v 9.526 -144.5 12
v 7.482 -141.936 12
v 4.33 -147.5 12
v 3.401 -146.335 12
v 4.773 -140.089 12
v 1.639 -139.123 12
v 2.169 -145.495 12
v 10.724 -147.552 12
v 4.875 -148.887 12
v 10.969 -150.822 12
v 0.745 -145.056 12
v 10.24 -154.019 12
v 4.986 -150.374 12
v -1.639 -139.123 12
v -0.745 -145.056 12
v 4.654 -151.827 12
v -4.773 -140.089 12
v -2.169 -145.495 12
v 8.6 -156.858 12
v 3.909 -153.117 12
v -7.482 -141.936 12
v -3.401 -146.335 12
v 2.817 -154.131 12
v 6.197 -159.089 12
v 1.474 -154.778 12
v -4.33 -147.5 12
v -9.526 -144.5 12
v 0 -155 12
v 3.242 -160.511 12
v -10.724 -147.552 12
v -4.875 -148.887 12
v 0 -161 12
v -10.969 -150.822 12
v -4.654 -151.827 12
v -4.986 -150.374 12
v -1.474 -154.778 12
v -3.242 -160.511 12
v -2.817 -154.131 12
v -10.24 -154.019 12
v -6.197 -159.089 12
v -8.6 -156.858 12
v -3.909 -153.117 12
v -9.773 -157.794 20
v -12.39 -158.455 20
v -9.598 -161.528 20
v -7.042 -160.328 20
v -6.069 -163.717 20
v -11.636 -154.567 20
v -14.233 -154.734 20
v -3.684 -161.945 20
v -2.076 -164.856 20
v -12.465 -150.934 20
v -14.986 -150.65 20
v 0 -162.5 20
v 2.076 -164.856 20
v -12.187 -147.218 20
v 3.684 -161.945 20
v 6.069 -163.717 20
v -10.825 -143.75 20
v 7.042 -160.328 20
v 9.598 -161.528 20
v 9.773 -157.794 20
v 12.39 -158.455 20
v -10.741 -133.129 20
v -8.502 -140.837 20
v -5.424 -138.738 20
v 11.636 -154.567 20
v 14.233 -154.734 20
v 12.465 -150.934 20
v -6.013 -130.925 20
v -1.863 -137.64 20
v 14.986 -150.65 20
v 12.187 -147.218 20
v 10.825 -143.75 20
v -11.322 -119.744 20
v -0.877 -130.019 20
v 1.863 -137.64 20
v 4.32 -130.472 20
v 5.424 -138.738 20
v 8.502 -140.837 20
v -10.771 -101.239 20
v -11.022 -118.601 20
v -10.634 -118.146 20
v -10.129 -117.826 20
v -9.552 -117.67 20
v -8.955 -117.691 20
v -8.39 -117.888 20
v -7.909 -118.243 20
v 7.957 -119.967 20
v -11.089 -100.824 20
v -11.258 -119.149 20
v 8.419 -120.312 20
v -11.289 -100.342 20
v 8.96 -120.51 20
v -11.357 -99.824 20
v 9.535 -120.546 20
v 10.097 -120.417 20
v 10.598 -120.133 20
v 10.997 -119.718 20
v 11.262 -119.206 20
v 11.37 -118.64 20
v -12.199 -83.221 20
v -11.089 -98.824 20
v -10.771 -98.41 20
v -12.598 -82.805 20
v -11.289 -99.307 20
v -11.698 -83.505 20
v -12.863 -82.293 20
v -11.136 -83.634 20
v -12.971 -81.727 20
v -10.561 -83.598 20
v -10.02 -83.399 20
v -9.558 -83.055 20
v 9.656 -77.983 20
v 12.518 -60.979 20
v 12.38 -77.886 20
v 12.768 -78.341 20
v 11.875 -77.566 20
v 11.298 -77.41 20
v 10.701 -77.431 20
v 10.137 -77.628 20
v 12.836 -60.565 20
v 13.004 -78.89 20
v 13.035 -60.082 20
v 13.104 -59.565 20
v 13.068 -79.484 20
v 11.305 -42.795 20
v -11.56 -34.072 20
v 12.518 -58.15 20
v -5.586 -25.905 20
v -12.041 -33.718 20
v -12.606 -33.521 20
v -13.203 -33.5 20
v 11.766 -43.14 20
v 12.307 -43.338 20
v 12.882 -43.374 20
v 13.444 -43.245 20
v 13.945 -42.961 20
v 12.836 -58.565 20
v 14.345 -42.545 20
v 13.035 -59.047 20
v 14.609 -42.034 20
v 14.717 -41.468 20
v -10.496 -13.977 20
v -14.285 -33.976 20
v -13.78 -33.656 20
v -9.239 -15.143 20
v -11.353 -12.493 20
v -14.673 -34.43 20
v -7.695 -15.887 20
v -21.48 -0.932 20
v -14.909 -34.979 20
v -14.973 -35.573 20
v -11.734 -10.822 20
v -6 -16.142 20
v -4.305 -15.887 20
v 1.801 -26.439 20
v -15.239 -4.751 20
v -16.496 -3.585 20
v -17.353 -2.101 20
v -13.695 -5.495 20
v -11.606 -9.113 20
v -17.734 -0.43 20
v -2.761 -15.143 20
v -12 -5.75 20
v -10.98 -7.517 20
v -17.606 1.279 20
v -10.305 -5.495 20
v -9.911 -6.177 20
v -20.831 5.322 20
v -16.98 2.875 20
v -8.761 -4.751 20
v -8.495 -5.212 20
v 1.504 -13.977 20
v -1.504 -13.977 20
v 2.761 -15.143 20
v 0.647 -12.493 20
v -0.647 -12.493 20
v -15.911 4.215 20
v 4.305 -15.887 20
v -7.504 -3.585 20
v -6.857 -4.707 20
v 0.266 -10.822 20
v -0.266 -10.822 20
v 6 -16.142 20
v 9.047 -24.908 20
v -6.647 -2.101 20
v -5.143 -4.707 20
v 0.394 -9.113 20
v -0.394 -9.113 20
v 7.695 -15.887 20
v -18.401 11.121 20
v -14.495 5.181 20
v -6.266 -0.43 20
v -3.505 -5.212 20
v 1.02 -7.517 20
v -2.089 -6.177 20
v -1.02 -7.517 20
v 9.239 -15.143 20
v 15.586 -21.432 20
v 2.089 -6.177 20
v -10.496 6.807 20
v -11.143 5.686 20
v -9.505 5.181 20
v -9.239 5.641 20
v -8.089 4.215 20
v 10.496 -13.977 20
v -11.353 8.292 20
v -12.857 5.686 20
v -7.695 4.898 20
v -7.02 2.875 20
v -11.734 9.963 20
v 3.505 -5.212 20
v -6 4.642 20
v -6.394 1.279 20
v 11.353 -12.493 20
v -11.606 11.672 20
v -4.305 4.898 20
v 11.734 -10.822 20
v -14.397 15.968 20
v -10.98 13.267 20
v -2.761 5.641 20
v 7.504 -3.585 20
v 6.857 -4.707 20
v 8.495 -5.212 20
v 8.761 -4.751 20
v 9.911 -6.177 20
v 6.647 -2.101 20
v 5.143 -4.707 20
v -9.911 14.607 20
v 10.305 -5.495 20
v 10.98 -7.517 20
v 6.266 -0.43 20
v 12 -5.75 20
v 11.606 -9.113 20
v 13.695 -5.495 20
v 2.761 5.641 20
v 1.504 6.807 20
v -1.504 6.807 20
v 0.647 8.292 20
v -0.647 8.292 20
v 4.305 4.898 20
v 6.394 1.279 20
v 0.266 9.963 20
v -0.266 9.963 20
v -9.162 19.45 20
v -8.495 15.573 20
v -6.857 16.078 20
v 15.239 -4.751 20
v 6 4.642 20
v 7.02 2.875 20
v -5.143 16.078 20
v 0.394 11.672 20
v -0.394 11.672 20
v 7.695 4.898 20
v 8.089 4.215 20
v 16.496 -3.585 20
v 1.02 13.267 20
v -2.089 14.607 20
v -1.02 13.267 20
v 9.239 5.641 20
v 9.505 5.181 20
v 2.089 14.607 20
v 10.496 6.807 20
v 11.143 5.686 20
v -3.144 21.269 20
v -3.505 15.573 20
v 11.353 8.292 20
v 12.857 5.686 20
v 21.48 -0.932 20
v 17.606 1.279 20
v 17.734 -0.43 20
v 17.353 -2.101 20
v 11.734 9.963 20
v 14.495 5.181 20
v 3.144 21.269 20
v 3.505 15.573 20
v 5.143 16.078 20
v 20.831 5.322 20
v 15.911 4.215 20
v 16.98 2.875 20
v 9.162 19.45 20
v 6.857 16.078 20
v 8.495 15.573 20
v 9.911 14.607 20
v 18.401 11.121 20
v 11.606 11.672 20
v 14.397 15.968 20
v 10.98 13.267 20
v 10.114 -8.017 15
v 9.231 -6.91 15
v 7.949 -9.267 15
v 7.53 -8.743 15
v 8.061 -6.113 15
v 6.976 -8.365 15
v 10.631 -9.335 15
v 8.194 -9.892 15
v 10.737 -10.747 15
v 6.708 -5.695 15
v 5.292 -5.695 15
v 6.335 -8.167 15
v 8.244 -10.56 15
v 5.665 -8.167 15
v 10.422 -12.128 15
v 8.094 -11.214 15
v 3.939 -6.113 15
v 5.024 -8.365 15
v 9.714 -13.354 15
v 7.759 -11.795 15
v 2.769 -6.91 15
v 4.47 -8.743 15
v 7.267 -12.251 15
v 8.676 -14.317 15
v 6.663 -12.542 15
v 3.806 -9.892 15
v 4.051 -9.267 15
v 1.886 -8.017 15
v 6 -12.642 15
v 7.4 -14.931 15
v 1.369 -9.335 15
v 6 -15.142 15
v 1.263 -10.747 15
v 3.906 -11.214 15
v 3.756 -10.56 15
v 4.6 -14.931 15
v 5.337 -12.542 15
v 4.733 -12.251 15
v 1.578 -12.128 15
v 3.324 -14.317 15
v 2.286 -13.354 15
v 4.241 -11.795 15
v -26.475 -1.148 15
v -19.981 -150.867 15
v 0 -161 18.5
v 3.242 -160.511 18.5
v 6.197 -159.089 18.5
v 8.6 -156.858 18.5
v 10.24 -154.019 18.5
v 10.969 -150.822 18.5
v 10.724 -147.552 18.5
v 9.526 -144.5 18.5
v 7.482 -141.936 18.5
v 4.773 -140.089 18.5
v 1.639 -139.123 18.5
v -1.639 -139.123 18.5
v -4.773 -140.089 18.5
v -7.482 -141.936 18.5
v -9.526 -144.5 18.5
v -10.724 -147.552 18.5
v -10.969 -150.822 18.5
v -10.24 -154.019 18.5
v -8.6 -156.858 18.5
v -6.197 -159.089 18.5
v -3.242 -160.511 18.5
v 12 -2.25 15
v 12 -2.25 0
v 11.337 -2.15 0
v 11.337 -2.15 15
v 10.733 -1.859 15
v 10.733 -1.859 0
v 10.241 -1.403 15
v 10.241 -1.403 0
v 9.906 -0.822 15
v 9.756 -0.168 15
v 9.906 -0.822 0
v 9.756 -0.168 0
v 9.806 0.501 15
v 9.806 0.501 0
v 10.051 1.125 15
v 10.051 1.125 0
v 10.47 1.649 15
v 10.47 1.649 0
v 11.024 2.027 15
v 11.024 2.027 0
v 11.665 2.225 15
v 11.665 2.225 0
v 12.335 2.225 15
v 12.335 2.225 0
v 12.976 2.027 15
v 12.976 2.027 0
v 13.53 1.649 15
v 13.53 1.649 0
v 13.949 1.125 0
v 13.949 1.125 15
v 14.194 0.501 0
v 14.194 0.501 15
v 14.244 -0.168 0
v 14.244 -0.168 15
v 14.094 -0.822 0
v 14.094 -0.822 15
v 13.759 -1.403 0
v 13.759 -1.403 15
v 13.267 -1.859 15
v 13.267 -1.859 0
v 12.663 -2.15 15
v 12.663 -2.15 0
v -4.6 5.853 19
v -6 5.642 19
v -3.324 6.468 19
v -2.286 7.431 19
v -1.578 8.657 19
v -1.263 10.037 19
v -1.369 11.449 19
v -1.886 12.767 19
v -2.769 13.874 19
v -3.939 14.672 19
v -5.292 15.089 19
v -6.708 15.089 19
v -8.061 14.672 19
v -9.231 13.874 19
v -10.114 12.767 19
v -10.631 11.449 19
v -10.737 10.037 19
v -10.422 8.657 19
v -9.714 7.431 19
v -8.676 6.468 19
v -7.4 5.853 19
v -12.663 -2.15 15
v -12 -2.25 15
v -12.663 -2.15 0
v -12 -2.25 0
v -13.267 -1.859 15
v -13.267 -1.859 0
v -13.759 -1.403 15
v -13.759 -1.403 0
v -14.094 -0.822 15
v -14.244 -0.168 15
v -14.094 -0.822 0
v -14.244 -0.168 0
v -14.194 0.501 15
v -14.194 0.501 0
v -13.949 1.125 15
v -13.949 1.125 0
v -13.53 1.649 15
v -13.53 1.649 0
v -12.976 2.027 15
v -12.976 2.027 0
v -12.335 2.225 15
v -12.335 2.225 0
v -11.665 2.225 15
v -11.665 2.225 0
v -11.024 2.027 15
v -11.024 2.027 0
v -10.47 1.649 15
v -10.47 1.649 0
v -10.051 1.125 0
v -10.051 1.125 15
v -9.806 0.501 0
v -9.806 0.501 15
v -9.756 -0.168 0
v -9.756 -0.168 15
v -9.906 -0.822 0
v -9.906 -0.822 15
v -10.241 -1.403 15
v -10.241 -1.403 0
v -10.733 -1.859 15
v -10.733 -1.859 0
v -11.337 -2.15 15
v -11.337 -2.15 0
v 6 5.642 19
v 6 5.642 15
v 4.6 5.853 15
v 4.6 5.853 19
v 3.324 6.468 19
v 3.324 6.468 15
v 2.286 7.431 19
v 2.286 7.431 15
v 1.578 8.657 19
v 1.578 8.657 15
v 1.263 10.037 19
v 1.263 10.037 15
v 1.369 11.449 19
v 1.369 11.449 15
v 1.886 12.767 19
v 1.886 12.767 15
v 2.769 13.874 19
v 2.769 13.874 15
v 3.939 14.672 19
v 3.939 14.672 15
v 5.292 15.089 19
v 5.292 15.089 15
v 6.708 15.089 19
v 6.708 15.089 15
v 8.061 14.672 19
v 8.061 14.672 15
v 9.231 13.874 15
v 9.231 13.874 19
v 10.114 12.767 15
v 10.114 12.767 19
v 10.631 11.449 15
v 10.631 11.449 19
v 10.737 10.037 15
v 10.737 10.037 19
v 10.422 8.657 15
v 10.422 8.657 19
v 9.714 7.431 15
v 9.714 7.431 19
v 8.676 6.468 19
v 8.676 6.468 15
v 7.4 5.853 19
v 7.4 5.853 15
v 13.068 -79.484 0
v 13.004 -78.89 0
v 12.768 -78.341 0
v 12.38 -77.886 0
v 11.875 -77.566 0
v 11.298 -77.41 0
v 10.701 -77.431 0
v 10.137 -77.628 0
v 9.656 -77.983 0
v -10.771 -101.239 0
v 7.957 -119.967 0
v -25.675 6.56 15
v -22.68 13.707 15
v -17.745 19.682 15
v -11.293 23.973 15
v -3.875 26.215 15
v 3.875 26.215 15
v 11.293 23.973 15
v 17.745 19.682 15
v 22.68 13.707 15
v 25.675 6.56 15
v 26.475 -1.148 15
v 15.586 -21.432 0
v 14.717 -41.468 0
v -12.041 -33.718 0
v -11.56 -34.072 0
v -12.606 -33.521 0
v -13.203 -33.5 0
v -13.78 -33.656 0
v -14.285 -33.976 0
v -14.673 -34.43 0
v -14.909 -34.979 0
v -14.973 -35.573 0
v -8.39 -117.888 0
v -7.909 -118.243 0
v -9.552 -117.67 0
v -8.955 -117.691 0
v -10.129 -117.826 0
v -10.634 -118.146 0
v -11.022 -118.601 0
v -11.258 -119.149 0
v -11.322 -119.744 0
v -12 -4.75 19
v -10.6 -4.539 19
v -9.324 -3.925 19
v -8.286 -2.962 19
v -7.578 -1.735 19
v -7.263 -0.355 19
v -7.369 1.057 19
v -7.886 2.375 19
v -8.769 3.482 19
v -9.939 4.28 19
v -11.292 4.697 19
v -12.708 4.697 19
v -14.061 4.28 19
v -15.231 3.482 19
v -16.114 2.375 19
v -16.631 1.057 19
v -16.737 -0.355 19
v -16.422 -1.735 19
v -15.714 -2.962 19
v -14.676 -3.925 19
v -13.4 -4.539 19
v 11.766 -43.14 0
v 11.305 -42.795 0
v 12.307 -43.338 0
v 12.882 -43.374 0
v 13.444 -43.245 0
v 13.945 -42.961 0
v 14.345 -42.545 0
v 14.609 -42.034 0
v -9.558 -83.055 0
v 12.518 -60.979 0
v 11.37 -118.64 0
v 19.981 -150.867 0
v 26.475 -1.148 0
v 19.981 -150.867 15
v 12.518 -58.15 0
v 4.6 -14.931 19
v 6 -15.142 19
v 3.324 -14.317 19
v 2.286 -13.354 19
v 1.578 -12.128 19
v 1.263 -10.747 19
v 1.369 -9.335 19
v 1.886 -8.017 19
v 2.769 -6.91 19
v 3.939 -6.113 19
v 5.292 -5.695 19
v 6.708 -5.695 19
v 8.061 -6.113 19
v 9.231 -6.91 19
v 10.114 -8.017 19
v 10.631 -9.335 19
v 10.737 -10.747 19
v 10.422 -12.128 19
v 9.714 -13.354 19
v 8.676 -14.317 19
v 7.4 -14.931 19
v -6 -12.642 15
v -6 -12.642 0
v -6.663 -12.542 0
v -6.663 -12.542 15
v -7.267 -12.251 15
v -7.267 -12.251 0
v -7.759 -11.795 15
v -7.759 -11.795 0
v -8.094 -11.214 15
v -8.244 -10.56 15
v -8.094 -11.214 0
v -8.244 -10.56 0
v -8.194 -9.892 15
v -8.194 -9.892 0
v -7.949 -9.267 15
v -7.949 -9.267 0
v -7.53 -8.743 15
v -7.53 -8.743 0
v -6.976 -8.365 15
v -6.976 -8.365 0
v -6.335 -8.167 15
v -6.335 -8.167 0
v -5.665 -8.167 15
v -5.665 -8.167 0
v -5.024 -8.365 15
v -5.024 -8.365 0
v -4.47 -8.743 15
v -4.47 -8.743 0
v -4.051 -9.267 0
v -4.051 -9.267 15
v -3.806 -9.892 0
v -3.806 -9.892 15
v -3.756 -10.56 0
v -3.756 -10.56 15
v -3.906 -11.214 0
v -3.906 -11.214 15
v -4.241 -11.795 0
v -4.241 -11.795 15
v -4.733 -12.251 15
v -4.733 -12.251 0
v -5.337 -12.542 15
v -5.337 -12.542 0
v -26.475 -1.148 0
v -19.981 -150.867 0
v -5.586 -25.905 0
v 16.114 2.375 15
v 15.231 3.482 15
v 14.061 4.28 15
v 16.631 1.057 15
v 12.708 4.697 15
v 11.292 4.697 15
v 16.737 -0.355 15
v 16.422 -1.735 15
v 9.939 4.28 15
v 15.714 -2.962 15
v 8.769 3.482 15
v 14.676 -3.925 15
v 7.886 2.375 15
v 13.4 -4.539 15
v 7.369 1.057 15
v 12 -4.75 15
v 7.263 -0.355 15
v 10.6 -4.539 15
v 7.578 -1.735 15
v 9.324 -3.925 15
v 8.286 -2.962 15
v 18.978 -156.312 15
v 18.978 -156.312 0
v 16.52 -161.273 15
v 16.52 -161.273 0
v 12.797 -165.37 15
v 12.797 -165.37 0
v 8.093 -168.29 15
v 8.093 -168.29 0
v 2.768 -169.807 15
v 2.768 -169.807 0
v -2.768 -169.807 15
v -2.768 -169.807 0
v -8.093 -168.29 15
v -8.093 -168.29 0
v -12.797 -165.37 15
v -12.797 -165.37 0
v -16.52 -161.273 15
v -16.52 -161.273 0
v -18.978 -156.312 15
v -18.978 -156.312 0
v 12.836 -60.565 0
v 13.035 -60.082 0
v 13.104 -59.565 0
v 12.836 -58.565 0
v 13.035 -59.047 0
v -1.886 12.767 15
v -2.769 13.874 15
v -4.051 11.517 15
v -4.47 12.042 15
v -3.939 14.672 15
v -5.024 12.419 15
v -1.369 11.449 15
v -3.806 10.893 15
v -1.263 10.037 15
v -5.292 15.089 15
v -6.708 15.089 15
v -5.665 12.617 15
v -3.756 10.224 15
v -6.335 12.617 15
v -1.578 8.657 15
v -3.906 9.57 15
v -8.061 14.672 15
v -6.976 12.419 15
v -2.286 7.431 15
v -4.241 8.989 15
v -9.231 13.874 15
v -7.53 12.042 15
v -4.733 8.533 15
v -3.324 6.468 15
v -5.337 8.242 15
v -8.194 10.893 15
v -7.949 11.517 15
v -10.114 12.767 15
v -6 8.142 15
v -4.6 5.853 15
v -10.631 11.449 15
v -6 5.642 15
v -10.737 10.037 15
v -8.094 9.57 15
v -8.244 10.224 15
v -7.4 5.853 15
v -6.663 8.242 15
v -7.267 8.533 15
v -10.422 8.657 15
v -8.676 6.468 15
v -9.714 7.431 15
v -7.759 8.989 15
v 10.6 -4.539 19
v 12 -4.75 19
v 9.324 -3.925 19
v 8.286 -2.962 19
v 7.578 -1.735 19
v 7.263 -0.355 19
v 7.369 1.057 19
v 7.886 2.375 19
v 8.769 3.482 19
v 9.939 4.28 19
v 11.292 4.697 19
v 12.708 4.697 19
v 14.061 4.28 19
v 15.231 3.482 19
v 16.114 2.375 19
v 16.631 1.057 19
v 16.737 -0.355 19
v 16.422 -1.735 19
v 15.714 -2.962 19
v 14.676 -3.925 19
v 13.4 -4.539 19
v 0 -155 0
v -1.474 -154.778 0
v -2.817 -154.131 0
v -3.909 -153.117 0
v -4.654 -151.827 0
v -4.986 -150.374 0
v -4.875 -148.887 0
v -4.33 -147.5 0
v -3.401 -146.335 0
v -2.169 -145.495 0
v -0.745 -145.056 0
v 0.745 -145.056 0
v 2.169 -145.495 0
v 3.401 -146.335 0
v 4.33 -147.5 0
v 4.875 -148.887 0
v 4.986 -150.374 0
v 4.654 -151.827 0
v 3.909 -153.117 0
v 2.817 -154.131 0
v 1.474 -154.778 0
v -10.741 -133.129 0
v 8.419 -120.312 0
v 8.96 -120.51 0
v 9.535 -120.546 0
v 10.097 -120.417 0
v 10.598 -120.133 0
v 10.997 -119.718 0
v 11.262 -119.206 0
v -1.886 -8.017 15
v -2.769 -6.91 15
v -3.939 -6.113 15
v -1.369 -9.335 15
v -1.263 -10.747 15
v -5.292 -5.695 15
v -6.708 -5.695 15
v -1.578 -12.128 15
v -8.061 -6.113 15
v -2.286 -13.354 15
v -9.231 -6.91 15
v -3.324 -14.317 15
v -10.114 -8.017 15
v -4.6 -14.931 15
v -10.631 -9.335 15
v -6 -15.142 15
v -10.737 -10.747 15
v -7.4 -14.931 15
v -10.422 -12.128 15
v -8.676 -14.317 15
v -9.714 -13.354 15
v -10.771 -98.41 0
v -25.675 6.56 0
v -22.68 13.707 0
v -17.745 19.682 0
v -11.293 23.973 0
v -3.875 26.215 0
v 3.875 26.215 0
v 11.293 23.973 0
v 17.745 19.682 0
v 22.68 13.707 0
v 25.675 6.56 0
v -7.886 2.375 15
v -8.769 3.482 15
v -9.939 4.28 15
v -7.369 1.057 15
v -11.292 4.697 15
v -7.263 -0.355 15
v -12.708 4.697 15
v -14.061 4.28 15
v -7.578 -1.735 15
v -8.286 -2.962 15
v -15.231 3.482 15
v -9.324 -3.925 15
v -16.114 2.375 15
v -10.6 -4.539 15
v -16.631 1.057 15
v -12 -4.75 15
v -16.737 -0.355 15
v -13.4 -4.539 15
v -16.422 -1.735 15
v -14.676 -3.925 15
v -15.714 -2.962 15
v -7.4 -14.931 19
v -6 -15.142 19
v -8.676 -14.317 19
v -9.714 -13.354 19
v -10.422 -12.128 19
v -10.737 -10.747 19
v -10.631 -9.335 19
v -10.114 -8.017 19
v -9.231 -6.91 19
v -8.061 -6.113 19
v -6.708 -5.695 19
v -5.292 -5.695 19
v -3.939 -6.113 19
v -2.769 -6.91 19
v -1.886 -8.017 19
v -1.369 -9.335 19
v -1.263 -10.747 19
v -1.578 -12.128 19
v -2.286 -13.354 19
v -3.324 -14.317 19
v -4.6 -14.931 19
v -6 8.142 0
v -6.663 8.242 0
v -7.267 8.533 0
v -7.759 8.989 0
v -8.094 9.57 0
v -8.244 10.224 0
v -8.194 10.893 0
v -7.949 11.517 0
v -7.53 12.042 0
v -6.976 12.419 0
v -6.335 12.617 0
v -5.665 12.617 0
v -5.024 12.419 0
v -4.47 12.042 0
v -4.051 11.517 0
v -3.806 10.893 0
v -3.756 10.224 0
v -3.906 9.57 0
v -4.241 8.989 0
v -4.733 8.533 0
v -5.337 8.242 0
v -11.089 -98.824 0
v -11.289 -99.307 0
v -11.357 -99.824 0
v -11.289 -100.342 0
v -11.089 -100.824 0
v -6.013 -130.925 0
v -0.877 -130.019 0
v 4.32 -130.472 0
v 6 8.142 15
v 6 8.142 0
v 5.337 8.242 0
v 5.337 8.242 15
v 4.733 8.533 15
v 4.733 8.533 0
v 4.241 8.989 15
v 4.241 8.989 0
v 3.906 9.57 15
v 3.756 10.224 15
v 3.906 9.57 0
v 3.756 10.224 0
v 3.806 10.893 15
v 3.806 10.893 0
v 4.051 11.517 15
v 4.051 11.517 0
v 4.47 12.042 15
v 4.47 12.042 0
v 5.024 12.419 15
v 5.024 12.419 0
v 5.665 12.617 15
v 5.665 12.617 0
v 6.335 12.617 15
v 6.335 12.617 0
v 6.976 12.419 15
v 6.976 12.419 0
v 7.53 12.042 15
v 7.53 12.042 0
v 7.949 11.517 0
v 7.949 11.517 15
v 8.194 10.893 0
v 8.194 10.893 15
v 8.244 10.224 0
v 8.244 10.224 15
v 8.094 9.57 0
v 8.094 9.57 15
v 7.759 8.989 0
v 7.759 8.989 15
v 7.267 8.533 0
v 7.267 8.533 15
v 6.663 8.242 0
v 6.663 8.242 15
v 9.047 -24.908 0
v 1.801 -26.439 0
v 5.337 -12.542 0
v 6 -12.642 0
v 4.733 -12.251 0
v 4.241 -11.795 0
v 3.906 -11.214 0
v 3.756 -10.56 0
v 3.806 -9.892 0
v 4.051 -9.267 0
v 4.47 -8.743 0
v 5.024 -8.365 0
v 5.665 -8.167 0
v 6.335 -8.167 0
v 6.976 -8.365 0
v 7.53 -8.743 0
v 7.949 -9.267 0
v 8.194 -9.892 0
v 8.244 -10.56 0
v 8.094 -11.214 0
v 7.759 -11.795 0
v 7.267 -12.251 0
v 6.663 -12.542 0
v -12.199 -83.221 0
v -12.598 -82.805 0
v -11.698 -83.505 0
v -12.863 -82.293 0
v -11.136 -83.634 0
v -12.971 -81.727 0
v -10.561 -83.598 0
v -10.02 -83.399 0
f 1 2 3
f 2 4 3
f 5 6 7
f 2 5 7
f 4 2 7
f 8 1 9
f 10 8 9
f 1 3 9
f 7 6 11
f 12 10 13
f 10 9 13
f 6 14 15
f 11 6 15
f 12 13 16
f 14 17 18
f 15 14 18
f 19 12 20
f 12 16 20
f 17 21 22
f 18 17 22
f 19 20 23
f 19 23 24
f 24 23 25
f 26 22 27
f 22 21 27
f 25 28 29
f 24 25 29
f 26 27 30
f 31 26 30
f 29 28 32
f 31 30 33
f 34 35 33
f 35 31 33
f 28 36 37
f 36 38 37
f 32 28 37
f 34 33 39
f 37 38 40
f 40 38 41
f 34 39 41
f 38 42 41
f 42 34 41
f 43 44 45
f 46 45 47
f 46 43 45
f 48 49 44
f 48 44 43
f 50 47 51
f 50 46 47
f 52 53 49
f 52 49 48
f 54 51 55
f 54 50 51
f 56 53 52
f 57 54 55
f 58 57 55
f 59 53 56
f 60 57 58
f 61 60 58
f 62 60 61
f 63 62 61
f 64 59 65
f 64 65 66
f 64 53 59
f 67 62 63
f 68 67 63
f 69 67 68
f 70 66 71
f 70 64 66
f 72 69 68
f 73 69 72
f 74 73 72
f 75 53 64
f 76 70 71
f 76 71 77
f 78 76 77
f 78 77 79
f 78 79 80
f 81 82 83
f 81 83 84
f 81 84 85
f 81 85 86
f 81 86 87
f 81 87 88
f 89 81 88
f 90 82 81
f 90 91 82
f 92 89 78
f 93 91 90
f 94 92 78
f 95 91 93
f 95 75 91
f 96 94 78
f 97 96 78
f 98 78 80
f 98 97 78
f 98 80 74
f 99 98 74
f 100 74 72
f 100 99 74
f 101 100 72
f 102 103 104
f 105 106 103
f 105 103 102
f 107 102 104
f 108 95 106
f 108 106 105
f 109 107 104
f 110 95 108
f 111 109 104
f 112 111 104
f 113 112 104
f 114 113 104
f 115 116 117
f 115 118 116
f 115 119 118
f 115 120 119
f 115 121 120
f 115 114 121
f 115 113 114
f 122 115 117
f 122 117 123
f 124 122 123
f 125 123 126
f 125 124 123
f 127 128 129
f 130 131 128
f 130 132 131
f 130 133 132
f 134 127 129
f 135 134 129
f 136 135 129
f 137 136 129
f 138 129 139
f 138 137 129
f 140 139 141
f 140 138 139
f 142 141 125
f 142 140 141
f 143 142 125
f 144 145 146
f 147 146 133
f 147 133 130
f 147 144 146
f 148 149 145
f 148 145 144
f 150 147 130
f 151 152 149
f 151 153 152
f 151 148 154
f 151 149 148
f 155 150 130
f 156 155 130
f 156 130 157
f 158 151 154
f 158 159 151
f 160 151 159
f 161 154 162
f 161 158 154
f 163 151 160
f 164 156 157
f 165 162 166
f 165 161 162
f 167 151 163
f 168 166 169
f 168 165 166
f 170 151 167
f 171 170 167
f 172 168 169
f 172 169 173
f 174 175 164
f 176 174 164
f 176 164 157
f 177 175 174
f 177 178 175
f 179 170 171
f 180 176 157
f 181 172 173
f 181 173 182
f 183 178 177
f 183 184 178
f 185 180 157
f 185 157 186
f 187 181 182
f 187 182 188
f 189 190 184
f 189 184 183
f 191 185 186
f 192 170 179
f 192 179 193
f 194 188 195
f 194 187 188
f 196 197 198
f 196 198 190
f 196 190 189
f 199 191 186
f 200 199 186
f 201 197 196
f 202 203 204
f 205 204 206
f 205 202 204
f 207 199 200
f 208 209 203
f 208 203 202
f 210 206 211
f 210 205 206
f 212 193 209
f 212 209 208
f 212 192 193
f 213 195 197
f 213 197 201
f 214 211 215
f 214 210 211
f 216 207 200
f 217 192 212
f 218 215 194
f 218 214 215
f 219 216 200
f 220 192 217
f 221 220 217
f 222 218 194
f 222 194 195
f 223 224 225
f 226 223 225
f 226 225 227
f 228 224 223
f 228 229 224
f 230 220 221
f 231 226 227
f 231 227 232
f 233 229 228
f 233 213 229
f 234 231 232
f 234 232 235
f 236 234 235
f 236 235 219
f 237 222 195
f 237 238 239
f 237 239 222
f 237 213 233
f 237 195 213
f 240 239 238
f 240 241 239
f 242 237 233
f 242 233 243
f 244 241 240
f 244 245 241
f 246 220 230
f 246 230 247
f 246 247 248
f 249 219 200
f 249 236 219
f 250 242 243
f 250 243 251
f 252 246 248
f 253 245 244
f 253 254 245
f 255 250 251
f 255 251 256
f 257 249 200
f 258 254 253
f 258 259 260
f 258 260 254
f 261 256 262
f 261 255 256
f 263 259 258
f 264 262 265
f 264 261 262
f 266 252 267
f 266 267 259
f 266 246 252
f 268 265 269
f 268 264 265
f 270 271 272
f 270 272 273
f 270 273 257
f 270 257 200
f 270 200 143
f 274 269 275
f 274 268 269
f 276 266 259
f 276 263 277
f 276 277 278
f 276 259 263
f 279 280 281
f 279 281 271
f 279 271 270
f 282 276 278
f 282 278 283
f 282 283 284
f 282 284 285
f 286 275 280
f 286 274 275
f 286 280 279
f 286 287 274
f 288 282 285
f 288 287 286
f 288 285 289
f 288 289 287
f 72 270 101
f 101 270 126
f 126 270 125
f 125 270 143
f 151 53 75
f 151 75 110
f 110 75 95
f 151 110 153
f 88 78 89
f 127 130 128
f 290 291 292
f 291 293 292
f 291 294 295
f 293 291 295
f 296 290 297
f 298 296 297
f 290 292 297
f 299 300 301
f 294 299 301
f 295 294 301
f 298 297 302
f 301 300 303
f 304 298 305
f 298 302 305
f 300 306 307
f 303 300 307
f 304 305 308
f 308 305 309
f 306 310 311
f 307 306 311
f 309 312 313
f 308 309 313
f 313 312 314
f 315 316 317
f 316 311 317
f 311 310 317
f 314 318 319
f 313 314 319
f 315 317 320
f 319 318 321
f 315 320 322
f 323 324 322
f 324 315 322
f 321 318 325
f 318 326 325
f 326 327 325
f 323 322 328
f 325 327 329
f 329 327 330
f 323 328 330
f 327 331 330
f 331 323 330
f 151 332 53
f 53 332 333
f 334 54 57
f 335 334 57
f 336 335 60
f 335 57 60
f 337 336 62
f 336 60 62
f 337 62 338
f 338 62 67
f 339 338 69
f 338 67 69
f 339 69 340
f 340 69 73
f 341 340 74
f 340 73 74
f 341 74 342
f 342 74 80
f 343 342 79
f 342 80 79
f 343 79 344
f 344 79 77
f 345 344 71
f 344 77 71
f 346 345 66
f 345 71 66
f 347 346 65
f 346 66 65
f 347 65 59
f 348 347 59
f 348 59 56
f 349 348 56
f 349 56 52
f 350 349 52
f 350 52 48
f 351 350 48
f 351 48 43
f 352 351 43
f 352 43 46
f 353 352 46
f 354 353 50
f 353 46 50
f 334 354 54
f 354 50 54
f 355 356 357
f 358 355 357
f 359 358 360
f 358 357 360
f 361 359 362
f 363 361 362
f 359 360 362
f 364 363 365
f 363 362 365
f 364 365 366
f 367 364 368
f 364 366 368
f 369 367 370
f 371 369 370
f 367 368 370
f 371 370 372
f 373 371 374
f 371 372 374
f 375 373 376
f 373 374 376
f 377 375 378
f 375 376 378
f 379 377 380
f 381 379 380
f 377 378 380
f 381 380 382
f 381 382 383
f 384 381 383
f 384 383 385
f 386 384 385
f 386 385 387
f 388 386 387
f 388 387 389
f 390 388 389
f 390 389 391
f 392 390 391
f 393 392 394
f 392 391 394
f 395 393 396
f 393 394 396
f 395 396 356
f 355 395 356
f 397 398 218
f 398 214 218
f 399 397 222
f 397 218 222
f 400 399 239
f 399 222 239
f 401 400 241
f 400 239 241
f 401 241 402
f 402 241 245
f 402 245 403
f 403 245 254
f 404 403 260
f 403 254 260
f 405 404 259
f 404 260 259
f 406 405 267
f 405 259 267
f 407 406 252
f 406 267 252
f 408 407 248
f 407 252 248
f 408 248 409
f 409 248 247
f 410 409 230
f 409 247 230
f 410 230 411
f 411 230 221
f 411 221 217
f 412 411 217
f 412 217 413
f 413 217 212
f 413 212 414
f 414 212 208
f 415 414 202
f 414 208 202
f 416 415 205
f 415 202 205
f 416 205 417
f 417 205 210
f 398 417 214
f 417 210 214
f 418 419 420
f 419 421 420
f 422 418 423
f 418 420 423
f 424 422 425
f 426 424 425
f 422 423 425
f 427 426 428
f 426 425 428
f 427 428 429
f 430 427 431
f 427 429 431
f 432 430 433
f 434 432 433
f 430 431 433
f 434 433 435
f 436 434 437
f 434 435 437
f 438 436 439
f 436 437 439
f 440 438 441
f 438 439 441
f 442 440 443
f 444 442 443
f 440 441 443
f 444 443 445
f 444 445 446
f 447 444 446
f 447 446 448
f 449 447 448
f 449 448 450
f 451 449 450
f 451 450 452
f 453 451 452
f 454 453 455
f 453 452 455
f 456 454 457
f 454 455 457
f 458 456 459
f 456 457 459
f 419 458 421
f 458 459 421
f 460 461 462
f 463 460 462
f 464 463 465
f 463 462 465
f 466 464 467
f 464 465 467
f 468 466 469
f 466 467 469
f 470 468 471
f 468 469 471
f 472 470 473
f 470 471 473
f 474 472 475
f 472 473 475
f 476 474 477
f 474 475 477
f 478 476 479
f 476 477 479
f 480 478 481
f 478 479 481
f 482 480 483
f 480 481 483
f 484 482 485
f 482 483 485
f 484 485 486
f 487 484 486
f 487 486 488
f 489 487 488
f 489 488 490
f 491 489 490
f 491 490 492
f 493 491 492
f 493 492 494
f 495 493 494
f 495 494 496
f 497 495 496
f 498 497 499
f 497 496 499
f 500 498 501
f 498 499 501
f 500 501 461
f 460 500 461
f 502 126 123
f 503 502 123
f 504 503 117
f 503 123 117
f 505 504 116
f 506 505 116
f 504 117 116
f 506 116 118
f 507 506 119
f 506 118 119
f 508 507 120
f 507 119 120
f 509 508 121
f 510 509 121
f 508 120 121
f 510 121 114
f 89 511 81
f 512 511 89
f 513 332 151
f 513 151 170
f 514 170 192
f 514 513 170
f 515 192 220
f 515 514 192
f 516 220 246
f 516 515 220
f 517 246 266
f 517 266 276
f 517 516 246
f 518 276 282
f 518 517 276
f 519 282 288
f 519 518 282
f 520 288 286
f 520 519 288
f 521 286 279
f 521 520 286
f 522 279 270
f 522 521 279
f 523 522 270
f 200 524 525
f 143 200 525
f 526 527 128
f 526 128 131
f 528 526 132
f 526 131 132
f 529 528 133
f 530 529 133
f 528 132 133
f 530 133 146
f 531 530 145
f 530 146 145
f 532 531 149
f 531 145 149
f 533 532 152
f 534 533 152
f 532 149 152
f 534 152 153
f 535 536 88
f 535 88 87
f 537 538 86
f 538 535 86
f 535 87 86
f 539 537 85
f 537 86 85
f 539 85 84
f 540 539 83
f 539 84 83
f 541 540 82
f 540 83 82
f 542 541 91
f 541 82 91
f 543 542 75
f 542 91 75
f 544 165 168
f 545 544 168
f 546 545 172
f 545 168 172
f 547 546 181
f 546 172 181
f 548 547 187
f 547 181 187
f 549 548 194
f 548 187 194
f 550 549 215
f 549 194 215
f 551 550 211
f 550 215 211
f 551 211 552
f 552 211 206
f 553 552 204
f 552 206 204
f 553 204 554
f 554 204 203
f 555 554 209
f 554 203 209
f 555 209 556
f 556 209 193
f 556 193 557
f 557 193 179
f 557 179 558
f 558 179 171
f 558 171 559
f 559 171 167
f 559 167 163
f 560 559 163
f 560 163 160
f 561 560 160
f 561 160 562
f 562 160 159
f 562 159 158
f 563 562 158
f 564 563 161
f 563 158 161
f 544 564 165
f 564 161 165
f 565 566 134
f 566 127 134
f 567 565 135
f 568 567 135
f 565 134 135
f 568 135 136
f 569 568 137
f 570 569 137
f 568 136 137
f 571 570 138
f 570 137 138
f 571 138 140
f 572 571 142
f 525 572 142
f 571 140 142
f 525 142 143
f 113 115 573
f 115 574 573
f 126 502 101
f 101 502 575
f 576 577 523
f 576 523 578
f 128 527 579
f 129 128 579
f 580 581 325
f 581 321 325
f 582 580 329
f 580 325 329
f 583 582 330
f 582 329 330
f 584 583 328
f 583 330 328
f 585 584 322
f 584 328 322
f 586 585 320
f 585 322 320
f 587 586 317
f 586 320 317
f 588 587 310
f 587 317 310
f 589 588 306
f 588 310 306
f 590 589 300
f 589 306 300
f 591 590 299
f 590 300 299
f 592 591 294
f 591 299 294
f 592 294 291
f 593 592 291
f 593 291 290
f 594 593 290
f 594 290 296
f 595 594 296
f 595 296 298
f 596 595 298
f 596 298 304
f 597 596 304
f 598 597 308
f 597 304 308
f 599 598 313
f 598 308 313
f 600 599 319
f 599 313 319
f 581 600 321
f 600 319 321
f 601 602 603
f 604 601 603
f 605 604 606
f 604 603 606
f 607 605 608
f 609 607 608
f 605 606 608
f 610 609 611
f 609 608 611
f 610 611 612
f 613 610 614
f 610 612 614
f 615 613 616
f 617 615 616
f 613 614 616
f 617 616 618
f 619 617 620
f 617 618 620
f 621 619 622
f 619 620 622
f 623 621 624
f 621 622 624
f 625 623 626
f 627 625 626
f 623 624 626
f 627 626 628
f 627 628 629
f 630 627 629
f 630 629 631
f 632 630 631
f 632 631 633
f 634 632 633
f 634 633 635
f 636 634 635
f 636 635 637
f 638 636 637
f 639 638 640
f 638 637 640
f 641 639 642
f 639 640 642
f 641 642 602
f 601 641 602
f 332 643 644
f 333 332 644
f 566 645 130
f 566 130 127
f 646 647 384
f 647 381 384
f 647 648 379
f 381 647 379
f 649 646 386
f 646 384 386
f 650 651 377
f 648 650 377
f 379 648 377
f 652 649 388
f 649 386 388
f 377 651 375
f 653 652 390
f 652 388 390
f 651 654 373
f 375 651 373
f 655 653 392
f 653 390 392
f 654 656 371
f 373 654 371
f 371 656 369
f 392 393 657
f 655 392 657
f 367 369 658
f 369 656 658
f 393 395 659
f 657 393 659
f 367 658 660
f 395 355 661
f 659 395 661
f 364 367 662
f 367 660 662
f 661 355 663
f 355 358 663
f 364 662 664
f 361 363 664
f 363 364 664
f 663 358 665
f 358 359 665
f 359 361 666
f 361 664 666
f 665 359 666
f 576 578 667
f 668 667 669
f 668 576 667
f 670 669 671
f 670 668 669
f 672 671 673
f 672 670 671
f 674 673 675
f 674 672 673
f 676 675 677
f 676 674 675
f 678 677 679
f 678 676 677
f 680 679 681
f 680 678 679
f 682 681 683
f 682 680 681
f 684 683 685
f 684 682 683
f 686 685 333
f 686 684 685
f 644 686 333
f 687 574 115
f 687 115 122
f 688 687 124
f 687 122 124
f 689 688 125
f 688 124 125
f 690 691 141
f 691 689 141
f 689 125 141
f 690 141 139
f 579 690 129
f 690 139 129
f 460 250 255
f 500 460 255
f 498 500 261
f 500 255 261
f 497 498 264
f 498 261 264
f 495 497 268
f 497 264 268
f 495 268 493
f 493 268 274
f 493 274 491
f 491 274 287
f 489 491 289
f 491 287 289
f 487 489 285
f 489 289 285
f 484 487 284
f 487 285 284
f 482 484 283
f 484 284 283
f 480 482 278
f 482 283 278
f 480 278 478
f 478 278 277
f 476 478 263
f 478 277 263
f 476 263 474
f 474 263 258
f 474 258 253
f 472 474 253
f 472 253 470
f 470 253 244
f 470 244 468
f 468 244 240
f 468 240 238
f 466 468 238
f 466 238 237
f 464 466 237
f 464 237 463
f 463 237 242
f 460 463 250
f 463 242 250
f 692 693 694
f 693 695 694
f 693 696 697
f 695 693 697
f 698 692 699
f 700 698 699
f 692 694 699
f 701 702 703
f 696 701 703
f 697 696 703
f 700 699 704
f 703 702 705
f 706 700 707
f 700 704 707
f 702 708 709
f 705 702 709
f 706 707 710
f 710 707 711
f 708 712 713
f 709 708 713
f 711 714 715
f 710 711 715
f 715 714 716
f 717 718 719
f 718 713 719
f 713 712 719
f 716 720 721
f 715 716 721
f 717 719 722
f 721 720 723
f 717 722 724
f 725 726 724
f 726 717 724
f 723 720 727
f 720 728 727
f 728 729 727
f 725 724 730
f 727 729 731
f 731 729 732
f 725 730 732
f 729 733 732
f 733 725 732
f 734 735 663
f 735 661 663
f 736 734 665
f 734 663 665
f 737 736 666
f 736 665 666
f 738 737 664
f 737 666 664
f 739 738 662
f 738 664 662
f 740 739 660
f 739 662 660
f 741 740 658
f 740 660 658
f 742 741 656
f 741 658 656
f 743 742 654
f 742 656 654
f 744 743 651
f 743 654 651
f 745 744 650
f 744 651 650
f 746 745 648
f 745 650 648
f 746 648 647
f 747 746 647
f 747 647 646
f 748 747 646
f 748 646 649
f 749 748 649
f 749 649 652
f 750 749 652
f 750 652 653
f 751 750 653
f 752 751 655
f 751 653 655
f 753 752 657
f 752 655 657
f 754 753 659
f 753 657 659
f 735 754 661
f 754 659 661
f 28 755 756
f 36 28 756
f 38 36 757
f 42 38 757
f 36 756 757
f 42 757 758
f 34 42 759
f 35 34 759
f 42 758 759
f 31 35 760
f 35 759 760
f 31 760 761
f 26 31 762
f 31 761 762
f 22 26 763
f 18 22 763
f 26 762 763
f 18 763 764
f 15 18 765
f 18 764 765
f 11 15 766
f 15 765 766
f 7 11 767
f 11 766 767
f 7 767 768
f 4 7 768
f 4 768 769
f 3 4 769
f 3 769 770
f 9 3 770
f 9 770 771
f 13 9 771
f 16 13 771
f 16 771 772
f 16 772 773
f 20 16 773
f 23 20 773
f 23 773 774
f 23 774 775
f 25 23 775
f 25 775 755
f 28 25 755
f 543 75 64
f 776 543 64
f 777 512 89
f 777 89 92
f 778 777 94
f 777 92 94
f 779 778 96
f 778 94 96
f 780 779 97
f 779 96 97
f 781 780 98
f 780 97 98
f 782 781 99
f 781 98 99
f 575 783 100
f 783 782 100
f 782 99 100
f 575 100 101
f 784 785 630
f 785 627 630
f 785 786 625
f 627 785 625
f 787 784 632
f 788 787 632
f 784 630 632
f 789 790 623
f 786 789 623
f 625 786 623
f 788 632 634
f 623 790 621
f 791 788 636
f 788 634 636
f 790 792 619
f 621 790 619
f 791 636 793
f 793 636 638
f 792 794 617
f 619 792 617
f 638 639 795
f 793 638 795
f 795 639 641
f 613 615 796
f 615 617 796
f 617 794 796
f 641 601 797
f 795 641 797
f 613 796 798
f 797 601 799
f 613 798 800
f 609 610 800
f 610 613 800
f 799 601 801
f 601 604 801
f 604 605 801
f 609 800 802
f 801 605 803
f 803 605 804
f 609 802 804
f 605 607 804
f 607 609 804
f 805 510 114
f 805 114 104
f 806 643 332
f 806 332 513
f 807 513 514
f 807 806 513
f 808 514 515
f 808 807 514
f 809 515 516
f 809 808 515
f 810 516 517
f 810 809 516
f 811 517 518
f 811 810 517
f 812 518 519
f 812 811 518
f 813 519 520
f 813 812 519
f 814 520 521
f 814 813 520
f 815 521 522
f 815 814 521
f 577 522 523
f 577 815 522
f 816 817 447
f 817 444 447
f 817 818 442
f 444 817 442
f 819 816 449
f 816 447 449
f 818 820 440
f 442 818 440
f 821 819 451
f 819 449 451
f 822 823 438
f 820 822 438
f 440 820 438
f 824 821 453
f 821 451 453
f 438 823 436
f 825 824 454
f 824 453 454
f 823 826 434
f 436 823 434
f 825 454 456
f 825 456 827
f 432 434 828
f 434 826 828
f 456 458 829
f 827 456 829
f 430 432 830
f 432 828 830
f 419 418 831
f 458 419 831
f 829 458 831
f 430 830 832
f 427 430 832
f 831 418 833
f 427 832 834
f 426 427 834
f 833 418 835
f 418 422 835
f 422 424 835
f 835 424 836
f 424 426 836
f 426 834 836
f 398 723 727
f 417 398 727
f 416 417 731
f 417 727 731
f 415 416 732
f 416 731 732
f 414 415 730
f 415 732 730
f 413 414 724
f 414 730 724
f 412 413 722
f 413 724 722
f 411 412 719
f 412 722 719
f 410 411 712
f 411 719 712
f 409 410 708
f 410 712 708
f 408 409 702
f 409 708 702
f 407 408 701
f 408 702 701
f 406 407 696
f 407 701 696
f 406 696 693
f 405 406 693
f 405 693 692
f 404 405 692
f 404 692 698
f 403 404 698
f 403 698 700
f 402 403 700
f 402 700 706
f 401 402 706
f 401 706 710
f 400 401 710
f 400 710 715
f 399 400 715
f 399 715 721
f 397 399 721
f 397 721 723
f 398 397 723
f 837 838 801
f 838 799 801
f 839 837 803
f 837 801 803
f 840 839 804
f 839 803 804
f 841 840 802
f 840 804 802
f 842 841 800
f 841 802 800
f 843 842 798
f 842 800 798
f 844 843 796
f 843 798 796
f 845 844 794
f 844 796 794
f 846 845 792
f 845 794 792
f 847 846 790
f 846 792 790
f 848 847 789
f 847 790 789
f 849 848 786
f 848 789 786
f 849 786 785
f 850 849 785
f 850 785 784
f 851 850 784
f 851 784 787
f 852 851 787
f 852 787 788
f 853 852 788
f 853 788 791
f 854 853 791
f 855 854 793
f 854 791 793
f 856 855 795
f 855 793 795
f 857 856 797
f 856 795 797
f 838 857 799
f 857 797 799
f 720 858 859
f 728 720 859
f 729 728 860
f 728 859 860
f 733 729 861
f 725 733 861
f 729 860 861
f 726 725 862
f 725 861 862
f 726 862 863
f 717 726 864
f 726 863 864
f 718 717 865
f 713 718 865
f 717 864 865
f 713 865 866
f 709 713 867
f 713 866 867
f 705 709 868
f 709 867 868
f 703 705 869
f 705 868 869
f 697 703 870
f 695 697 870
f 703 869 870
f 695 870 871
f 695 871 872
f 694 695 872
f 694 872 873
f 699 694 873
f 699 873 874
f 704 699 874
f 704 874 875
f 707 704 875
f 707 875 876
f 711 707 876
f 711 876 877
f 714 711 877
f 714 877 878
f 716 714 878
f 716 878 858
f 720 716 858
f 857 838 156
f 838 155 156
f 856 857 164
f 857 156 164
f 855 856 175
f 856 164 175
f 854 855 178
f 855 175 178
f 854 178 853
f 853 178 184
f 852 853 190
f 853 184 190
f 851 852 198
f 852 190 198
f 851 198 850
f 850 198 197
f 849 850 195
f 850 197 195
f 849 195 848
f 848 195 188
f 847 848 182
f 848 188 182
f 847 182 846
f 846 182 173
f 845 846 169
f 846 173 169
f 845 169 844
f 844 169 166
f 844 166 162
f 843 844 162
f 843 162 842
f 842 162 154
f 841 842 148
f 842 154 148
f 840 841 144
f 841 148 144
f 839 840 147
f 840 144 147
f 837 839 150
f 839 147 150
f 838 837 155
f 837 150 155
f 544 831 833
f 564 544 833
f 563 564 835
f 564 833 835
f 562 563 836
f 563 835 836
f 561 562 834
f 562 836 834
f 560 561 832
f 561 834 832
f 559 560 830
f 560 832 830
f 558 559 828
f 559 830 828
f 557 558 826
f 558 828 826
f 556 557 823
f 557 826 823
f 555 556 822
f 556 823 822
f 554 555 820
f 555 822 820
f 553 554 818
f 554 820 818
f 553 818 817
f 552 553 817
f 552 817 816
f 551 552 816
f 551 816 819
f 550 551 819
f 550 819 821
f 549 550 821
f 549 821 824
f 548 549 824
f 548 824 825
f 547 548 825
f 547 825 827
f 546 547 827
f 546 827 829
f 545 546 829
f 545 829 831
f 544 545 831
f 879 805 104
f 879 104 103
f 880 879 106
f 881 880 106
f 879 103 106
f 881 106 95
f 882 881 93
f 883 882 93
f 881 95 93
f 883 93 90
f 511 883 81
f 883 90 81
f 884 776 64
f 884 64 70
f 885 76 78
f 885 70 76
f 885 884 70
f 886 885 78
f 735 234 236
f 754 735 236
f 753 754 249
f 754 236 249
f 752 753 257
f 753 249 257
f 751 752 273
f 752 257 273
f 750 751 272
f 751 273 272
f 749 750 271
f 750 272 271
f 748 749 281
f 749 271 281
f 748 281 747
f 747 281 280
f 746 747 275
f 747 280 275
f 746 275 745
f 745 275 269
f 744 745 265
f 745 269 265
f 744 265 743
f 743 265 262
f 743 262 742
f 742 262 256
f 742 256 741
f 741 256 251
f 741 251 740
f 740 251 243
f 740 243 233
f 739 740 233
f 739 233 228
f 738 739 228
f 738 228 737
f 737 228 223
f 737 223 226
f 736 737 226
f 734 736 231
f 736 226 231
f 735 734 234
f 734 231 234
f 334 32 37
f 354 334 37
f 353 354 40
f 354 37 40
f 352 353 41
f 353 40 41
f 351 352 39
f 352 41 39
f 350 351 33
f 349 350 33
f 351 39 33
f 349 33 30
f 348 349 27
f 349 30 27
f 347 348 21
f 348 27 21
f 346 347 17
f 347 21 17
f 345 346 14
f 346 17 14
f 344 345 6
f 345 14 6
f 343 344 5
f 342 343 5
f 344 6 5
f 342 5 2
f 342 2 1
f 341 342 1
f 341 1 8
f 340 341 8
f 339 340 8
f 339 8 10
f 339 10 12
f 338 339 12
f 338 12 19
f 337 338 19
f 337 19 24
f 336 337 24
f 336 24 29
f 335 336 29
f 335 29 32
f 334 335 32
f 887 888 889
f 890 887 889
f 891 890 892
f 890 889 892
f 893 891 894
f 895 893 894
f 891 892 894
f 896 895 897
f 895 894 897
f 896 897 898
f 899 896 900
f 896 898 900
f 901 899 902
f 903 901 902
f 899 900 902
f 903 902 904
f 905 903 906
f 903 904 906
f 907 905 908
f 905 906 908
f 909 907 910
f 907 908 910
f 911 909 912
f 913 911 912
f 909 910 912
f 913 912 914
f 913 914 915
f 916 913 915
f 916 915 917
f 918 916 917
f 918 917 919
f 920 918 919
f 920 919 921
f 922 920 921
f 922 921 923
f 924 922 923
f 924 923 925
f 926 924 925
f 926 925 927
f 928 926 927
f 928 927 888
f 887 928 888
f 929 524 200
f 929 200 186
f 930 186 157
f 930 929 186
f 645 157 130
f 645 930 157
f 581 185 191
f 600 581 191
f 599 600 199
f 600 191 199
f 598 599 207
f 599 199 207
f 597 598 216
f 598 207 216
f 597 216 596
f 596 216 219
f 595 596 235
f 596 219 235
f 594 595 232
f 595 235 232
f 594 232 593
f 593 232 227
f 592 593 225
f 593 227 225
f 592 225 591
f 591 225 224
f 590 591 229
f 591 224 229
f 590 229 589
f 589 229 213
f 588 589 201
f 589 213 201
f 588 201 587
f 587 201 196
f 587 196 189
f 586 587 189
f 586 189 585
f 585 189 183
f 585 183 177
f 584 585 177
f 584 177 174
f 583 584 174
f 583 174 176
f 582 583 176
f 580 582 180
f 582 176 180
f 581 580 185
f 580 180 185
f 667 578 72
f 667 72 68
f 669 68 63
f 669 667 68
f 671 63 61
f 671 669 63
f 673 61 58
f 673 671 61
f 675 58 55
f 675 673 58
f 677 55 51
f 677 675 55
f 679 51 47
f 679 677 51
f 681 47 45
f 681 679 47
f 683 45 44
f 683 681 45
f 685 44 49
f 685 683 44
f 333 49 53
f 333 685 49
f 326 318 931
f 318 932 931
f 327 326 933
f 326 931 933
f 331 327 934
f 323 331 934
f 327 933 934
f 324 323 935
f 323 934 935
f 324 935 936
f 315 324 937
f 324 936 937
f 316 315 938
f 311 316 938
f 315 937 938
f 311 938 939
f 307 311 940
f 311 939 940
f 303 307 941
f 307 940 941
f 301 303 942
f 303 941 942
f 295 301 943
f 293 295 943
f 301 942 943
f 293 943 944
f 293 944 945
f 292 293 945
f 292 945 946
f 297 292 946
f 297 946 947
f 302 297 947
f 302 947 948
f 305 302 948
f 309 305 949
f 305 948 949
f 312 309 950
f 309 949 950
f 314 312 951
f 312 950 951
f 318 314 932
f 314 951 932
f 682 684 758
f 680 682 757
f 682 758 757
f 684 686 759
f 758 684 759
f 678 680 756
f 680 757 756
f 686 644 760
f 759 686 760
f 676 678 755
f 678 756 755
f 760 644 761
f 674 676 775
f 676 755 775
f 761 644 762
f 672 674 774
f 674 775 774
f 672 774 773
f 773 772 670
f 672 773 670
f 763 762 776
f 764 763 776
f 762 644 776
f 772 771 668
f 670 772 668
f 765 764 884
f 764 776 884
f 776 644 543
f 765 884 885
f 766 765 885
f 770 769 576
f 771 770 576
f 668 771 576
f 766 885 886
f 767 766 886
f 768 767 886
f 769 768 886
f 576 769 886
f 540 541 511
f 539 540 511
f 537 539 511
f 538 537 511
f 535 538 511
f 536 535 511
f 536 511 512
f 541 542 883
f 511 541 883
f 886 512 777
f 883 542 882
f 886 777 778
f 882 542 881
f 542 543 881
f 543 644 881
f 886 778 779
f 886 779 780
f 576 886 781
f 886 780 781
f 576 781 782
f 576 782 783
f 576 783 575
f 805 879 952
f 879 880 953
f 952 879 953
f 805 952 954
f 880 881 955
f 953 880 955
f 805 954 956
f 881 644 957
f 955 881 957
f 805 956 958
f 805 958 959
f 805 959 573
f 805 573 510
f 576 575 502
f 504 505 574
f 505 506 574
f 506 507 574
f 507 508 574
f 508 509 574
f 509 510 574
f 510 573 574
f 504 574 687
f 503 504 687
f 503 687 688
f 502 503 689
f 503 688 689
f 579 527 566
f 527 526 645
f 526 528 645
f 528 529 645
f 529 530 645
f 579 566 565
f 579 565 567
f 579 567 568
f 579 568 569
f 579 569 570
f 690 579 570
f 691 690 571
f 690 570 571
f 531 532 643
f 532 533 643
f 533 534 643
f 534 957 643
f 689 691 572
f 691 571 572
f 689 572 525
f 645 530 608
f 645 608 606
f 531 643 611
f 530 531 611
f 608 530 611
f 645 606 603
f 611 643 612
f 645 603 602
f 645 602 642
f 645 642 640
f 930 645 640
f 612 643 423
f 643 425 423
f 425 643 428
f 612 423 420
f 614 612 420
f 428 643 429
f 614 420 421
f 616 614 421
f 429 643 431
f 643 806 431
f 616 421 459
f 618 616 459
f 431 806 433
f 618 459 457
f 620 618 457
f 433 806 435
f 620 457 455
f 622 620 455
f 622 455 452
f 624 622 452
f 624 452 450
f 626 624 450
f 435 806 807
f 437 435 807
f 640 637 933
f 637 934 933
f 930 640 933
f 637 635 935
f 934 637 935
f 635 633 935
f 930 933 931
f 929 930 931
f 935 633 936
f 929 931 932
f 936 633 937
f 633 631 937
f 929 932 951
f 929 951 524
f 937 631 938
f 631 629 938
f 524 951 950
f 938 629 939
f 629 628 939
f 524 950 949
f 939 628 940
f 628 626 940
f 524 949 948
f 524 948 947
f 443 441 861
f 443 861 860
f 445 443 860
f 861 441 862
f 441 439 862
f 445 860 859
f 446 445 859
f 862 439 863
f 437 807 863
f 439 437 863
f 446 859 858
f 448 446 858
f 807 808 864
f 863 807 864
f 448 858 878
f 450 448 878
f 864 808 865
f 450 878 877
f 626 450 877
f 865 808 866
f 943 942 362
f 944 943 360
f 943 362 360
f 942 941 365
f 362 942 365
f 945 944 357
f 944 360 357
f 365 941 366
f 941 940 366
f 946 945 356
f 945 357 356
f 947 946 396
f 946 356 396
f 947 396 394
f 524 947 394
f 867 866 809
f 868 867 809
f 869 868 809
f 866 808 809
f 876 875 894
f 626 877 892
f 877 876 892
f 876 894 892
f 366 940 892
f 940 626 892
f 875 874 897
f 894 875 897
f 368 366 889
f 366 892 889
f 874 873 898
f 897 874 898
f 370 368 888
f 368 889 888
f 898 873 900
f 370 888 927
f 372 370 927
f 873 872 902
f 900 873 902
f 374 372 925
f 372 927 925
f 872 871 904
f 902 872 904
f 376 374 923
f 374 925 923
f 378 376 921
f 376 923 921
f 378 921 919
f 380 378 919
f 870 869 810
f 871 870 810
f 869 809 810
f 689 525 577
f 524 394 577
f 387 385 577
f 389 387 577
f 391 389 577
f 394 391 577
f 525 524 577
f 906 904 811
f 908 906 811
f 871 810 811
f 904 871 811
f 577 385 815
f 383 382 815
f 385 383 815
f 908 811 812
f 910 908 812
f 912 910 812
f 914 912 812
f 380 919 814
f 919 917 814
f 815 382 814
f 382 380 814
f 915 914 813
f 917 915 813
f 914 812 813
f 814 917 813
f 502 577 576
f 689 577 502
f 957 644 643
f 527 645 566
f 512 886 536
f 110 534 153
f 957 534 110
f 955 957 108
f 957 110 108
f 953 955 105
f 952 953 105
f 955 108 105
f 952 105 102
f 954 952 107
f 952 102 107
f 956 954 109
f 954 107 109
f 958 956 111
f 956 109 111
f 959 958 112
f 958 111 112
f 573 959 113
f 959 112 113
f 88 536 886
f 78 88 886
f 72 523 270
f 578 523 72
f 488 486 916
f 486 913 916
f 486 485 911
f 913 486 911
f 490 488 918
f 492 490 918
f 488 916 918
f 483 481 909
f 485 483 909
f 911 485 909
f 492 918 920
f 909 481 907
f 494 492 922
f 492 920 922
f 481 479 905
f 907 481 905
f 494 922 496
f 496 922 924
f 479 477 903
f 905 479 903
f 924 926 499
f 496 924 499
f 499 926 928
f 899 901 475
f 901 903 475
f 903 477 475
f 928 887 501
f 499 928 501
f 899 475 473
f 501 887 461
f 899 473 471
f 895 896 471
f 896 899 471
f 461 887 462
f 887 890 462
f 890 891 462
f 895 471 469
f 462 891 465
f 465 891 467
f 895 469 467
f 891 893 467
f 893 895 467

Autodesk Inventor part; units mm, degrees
ref_plane "YZ Plane" through (0, 0, 0) normal (1, 0, 0) x (0, 1, 0)
ref_plane "XZ Plane" through (0, 0, 0) normal (0, 1, 0) x (-1, 0, 0)
ref_plane "XY Plane" through (0, 0, 0) normal (0, 0, 1) x (1, 0, 0)
sketch "Sketch1" plane through (0, 0, 0) normal (0, 0, 1) x (1, 0, 0)
  circle A0 centre (0, 0) radius 26.5
  circle A1 centre (0, -150) radius 20
  line L0 (-26.4751, -1.1483) -> (-19.9812, -150.8667)
  line L1 (26.4751, -1.1483) -> (19.9812, -150.8667)
  line L2 (-15.5859, -21.432) -> (-10.7412, -133.1291)
  line L3 (15.5859, -21.432) -> (10.7412, -133.1291)
  line L4 (-5.5859, -25.9046) -> (14.5199, -46.0104)
  line L5 (-15.1953, -30.4373) -> (13.932, -59.5646)
  line L6 (-37.1, 0) -> (37.1, 0) projected
  line L7 (13.932, -59.5646) -> (-12.7736, -86.2702)
  line L8 (13.2907, -74.3479) -> (-12.1857, -99.8244)
  line L9 (-12.1857, -99.8244) -> (11.1726, -123.1827)
  line L10 (-11.5445, -114.6078) -> (4.3198, -130.4721)
  point P0 (-26.5, 0)
  point P1 (26.5, 0)
  dimension "d0" = 53
  dimension "d1" = 40
  dimension "d2" = 150
  dimension "d4" = 10
  dimension "d5" = 10
  dimension "d6" = 10
  dimension "d7" = 45
  dimension "d8" = 10
  dimension "d9" = 10
  dimension "d10" = 90
  dimension "d11" = 90
  dimension "d12" = 10
extrude "Extrusion1" add sketch "Sketch1" along normal blind 20 contours A0 L6 | A0 L2 A1 L0 | A0 L4 L3 L5 L2 | A0 L6 | A1 | A1 L3 A0 L1 | L7 L3 L8 L2 | L10 L2 L9 L3 A1
sketch "Sketch2" plane through (0, 0, 20) normal (0, 0, 1) x (1, 0, 0)
  line L0 (0, -209.3) -> (0, 65.8) projected
  line L1 (-6, 10.3923) -> (0, 0) construction
  point P0 (6, 10.3923)
  point P1 (-6, -10.3923)
  point P2 (-12, 0)
  point P3 (12, 0)
  point P4 (6, -10.3923)
  dimension "d18" = 12
  dimension "d19" = 12
  dimension "d22" = 360
hole "Hole1" at (-6, 10.3923, 20) at (-6, -10.3923, 20) at (-12, 0, 20) at (12, 0, 20) at (6, -10.3923, 20) at (6, 10.3923, 20) direction (0, 0, -1) diameter 4.5 end through all counterbore diameter 9.5 counterbore depth 5
fillet "Fillet1" radius 2 8 edges at (-15.1953, -30.4373, 10) (13.932, -59.5646, 10) (14.5199, -46.0104, 10) (-12.7736, -86.2702, 10) (13.2907, -74.3479, 10) (-12.1857, -99.8244, 10) (11.1726, -123.1827, 10) (-11.5445, -114.6078, 10)
chamfer "Chamfer3" distance 1 angle 45 6 edges at (-12, 4.75, 20) (-6, -5.6423, 20) (-6, 15.1423, 20) (6, -5.6423, 20) (6, 15.1423, 20) (12, 4.75, 20)
chamfer "Chamfer2" distance 5 angle 45 4 edges at (23.2282, -76.0075, 20) (0, 26.5, 20) (-23.2282, -76.0075, 20) (0, -170, 20)
sketch "Sketch3" plane through (0, 0, 20) normal (0, 0, 1) x (1, 0, 0)
  arc A0 (-14.9859, -150.65) -> (14.9859, -150.65) centre (0, -150) ccw projected
  point P0 (0, 0)
hole "Hole2" at (0, -150, 20) direction (0, 0, -1) diameter 10 end through all counterbore diameter 22 counterbore depth 8
chamfer "Chamfer4" distance 1.5 angle 45 1 edges at (0, -139, 20)
properties part number "UPPER_LINKAGE_LH"
